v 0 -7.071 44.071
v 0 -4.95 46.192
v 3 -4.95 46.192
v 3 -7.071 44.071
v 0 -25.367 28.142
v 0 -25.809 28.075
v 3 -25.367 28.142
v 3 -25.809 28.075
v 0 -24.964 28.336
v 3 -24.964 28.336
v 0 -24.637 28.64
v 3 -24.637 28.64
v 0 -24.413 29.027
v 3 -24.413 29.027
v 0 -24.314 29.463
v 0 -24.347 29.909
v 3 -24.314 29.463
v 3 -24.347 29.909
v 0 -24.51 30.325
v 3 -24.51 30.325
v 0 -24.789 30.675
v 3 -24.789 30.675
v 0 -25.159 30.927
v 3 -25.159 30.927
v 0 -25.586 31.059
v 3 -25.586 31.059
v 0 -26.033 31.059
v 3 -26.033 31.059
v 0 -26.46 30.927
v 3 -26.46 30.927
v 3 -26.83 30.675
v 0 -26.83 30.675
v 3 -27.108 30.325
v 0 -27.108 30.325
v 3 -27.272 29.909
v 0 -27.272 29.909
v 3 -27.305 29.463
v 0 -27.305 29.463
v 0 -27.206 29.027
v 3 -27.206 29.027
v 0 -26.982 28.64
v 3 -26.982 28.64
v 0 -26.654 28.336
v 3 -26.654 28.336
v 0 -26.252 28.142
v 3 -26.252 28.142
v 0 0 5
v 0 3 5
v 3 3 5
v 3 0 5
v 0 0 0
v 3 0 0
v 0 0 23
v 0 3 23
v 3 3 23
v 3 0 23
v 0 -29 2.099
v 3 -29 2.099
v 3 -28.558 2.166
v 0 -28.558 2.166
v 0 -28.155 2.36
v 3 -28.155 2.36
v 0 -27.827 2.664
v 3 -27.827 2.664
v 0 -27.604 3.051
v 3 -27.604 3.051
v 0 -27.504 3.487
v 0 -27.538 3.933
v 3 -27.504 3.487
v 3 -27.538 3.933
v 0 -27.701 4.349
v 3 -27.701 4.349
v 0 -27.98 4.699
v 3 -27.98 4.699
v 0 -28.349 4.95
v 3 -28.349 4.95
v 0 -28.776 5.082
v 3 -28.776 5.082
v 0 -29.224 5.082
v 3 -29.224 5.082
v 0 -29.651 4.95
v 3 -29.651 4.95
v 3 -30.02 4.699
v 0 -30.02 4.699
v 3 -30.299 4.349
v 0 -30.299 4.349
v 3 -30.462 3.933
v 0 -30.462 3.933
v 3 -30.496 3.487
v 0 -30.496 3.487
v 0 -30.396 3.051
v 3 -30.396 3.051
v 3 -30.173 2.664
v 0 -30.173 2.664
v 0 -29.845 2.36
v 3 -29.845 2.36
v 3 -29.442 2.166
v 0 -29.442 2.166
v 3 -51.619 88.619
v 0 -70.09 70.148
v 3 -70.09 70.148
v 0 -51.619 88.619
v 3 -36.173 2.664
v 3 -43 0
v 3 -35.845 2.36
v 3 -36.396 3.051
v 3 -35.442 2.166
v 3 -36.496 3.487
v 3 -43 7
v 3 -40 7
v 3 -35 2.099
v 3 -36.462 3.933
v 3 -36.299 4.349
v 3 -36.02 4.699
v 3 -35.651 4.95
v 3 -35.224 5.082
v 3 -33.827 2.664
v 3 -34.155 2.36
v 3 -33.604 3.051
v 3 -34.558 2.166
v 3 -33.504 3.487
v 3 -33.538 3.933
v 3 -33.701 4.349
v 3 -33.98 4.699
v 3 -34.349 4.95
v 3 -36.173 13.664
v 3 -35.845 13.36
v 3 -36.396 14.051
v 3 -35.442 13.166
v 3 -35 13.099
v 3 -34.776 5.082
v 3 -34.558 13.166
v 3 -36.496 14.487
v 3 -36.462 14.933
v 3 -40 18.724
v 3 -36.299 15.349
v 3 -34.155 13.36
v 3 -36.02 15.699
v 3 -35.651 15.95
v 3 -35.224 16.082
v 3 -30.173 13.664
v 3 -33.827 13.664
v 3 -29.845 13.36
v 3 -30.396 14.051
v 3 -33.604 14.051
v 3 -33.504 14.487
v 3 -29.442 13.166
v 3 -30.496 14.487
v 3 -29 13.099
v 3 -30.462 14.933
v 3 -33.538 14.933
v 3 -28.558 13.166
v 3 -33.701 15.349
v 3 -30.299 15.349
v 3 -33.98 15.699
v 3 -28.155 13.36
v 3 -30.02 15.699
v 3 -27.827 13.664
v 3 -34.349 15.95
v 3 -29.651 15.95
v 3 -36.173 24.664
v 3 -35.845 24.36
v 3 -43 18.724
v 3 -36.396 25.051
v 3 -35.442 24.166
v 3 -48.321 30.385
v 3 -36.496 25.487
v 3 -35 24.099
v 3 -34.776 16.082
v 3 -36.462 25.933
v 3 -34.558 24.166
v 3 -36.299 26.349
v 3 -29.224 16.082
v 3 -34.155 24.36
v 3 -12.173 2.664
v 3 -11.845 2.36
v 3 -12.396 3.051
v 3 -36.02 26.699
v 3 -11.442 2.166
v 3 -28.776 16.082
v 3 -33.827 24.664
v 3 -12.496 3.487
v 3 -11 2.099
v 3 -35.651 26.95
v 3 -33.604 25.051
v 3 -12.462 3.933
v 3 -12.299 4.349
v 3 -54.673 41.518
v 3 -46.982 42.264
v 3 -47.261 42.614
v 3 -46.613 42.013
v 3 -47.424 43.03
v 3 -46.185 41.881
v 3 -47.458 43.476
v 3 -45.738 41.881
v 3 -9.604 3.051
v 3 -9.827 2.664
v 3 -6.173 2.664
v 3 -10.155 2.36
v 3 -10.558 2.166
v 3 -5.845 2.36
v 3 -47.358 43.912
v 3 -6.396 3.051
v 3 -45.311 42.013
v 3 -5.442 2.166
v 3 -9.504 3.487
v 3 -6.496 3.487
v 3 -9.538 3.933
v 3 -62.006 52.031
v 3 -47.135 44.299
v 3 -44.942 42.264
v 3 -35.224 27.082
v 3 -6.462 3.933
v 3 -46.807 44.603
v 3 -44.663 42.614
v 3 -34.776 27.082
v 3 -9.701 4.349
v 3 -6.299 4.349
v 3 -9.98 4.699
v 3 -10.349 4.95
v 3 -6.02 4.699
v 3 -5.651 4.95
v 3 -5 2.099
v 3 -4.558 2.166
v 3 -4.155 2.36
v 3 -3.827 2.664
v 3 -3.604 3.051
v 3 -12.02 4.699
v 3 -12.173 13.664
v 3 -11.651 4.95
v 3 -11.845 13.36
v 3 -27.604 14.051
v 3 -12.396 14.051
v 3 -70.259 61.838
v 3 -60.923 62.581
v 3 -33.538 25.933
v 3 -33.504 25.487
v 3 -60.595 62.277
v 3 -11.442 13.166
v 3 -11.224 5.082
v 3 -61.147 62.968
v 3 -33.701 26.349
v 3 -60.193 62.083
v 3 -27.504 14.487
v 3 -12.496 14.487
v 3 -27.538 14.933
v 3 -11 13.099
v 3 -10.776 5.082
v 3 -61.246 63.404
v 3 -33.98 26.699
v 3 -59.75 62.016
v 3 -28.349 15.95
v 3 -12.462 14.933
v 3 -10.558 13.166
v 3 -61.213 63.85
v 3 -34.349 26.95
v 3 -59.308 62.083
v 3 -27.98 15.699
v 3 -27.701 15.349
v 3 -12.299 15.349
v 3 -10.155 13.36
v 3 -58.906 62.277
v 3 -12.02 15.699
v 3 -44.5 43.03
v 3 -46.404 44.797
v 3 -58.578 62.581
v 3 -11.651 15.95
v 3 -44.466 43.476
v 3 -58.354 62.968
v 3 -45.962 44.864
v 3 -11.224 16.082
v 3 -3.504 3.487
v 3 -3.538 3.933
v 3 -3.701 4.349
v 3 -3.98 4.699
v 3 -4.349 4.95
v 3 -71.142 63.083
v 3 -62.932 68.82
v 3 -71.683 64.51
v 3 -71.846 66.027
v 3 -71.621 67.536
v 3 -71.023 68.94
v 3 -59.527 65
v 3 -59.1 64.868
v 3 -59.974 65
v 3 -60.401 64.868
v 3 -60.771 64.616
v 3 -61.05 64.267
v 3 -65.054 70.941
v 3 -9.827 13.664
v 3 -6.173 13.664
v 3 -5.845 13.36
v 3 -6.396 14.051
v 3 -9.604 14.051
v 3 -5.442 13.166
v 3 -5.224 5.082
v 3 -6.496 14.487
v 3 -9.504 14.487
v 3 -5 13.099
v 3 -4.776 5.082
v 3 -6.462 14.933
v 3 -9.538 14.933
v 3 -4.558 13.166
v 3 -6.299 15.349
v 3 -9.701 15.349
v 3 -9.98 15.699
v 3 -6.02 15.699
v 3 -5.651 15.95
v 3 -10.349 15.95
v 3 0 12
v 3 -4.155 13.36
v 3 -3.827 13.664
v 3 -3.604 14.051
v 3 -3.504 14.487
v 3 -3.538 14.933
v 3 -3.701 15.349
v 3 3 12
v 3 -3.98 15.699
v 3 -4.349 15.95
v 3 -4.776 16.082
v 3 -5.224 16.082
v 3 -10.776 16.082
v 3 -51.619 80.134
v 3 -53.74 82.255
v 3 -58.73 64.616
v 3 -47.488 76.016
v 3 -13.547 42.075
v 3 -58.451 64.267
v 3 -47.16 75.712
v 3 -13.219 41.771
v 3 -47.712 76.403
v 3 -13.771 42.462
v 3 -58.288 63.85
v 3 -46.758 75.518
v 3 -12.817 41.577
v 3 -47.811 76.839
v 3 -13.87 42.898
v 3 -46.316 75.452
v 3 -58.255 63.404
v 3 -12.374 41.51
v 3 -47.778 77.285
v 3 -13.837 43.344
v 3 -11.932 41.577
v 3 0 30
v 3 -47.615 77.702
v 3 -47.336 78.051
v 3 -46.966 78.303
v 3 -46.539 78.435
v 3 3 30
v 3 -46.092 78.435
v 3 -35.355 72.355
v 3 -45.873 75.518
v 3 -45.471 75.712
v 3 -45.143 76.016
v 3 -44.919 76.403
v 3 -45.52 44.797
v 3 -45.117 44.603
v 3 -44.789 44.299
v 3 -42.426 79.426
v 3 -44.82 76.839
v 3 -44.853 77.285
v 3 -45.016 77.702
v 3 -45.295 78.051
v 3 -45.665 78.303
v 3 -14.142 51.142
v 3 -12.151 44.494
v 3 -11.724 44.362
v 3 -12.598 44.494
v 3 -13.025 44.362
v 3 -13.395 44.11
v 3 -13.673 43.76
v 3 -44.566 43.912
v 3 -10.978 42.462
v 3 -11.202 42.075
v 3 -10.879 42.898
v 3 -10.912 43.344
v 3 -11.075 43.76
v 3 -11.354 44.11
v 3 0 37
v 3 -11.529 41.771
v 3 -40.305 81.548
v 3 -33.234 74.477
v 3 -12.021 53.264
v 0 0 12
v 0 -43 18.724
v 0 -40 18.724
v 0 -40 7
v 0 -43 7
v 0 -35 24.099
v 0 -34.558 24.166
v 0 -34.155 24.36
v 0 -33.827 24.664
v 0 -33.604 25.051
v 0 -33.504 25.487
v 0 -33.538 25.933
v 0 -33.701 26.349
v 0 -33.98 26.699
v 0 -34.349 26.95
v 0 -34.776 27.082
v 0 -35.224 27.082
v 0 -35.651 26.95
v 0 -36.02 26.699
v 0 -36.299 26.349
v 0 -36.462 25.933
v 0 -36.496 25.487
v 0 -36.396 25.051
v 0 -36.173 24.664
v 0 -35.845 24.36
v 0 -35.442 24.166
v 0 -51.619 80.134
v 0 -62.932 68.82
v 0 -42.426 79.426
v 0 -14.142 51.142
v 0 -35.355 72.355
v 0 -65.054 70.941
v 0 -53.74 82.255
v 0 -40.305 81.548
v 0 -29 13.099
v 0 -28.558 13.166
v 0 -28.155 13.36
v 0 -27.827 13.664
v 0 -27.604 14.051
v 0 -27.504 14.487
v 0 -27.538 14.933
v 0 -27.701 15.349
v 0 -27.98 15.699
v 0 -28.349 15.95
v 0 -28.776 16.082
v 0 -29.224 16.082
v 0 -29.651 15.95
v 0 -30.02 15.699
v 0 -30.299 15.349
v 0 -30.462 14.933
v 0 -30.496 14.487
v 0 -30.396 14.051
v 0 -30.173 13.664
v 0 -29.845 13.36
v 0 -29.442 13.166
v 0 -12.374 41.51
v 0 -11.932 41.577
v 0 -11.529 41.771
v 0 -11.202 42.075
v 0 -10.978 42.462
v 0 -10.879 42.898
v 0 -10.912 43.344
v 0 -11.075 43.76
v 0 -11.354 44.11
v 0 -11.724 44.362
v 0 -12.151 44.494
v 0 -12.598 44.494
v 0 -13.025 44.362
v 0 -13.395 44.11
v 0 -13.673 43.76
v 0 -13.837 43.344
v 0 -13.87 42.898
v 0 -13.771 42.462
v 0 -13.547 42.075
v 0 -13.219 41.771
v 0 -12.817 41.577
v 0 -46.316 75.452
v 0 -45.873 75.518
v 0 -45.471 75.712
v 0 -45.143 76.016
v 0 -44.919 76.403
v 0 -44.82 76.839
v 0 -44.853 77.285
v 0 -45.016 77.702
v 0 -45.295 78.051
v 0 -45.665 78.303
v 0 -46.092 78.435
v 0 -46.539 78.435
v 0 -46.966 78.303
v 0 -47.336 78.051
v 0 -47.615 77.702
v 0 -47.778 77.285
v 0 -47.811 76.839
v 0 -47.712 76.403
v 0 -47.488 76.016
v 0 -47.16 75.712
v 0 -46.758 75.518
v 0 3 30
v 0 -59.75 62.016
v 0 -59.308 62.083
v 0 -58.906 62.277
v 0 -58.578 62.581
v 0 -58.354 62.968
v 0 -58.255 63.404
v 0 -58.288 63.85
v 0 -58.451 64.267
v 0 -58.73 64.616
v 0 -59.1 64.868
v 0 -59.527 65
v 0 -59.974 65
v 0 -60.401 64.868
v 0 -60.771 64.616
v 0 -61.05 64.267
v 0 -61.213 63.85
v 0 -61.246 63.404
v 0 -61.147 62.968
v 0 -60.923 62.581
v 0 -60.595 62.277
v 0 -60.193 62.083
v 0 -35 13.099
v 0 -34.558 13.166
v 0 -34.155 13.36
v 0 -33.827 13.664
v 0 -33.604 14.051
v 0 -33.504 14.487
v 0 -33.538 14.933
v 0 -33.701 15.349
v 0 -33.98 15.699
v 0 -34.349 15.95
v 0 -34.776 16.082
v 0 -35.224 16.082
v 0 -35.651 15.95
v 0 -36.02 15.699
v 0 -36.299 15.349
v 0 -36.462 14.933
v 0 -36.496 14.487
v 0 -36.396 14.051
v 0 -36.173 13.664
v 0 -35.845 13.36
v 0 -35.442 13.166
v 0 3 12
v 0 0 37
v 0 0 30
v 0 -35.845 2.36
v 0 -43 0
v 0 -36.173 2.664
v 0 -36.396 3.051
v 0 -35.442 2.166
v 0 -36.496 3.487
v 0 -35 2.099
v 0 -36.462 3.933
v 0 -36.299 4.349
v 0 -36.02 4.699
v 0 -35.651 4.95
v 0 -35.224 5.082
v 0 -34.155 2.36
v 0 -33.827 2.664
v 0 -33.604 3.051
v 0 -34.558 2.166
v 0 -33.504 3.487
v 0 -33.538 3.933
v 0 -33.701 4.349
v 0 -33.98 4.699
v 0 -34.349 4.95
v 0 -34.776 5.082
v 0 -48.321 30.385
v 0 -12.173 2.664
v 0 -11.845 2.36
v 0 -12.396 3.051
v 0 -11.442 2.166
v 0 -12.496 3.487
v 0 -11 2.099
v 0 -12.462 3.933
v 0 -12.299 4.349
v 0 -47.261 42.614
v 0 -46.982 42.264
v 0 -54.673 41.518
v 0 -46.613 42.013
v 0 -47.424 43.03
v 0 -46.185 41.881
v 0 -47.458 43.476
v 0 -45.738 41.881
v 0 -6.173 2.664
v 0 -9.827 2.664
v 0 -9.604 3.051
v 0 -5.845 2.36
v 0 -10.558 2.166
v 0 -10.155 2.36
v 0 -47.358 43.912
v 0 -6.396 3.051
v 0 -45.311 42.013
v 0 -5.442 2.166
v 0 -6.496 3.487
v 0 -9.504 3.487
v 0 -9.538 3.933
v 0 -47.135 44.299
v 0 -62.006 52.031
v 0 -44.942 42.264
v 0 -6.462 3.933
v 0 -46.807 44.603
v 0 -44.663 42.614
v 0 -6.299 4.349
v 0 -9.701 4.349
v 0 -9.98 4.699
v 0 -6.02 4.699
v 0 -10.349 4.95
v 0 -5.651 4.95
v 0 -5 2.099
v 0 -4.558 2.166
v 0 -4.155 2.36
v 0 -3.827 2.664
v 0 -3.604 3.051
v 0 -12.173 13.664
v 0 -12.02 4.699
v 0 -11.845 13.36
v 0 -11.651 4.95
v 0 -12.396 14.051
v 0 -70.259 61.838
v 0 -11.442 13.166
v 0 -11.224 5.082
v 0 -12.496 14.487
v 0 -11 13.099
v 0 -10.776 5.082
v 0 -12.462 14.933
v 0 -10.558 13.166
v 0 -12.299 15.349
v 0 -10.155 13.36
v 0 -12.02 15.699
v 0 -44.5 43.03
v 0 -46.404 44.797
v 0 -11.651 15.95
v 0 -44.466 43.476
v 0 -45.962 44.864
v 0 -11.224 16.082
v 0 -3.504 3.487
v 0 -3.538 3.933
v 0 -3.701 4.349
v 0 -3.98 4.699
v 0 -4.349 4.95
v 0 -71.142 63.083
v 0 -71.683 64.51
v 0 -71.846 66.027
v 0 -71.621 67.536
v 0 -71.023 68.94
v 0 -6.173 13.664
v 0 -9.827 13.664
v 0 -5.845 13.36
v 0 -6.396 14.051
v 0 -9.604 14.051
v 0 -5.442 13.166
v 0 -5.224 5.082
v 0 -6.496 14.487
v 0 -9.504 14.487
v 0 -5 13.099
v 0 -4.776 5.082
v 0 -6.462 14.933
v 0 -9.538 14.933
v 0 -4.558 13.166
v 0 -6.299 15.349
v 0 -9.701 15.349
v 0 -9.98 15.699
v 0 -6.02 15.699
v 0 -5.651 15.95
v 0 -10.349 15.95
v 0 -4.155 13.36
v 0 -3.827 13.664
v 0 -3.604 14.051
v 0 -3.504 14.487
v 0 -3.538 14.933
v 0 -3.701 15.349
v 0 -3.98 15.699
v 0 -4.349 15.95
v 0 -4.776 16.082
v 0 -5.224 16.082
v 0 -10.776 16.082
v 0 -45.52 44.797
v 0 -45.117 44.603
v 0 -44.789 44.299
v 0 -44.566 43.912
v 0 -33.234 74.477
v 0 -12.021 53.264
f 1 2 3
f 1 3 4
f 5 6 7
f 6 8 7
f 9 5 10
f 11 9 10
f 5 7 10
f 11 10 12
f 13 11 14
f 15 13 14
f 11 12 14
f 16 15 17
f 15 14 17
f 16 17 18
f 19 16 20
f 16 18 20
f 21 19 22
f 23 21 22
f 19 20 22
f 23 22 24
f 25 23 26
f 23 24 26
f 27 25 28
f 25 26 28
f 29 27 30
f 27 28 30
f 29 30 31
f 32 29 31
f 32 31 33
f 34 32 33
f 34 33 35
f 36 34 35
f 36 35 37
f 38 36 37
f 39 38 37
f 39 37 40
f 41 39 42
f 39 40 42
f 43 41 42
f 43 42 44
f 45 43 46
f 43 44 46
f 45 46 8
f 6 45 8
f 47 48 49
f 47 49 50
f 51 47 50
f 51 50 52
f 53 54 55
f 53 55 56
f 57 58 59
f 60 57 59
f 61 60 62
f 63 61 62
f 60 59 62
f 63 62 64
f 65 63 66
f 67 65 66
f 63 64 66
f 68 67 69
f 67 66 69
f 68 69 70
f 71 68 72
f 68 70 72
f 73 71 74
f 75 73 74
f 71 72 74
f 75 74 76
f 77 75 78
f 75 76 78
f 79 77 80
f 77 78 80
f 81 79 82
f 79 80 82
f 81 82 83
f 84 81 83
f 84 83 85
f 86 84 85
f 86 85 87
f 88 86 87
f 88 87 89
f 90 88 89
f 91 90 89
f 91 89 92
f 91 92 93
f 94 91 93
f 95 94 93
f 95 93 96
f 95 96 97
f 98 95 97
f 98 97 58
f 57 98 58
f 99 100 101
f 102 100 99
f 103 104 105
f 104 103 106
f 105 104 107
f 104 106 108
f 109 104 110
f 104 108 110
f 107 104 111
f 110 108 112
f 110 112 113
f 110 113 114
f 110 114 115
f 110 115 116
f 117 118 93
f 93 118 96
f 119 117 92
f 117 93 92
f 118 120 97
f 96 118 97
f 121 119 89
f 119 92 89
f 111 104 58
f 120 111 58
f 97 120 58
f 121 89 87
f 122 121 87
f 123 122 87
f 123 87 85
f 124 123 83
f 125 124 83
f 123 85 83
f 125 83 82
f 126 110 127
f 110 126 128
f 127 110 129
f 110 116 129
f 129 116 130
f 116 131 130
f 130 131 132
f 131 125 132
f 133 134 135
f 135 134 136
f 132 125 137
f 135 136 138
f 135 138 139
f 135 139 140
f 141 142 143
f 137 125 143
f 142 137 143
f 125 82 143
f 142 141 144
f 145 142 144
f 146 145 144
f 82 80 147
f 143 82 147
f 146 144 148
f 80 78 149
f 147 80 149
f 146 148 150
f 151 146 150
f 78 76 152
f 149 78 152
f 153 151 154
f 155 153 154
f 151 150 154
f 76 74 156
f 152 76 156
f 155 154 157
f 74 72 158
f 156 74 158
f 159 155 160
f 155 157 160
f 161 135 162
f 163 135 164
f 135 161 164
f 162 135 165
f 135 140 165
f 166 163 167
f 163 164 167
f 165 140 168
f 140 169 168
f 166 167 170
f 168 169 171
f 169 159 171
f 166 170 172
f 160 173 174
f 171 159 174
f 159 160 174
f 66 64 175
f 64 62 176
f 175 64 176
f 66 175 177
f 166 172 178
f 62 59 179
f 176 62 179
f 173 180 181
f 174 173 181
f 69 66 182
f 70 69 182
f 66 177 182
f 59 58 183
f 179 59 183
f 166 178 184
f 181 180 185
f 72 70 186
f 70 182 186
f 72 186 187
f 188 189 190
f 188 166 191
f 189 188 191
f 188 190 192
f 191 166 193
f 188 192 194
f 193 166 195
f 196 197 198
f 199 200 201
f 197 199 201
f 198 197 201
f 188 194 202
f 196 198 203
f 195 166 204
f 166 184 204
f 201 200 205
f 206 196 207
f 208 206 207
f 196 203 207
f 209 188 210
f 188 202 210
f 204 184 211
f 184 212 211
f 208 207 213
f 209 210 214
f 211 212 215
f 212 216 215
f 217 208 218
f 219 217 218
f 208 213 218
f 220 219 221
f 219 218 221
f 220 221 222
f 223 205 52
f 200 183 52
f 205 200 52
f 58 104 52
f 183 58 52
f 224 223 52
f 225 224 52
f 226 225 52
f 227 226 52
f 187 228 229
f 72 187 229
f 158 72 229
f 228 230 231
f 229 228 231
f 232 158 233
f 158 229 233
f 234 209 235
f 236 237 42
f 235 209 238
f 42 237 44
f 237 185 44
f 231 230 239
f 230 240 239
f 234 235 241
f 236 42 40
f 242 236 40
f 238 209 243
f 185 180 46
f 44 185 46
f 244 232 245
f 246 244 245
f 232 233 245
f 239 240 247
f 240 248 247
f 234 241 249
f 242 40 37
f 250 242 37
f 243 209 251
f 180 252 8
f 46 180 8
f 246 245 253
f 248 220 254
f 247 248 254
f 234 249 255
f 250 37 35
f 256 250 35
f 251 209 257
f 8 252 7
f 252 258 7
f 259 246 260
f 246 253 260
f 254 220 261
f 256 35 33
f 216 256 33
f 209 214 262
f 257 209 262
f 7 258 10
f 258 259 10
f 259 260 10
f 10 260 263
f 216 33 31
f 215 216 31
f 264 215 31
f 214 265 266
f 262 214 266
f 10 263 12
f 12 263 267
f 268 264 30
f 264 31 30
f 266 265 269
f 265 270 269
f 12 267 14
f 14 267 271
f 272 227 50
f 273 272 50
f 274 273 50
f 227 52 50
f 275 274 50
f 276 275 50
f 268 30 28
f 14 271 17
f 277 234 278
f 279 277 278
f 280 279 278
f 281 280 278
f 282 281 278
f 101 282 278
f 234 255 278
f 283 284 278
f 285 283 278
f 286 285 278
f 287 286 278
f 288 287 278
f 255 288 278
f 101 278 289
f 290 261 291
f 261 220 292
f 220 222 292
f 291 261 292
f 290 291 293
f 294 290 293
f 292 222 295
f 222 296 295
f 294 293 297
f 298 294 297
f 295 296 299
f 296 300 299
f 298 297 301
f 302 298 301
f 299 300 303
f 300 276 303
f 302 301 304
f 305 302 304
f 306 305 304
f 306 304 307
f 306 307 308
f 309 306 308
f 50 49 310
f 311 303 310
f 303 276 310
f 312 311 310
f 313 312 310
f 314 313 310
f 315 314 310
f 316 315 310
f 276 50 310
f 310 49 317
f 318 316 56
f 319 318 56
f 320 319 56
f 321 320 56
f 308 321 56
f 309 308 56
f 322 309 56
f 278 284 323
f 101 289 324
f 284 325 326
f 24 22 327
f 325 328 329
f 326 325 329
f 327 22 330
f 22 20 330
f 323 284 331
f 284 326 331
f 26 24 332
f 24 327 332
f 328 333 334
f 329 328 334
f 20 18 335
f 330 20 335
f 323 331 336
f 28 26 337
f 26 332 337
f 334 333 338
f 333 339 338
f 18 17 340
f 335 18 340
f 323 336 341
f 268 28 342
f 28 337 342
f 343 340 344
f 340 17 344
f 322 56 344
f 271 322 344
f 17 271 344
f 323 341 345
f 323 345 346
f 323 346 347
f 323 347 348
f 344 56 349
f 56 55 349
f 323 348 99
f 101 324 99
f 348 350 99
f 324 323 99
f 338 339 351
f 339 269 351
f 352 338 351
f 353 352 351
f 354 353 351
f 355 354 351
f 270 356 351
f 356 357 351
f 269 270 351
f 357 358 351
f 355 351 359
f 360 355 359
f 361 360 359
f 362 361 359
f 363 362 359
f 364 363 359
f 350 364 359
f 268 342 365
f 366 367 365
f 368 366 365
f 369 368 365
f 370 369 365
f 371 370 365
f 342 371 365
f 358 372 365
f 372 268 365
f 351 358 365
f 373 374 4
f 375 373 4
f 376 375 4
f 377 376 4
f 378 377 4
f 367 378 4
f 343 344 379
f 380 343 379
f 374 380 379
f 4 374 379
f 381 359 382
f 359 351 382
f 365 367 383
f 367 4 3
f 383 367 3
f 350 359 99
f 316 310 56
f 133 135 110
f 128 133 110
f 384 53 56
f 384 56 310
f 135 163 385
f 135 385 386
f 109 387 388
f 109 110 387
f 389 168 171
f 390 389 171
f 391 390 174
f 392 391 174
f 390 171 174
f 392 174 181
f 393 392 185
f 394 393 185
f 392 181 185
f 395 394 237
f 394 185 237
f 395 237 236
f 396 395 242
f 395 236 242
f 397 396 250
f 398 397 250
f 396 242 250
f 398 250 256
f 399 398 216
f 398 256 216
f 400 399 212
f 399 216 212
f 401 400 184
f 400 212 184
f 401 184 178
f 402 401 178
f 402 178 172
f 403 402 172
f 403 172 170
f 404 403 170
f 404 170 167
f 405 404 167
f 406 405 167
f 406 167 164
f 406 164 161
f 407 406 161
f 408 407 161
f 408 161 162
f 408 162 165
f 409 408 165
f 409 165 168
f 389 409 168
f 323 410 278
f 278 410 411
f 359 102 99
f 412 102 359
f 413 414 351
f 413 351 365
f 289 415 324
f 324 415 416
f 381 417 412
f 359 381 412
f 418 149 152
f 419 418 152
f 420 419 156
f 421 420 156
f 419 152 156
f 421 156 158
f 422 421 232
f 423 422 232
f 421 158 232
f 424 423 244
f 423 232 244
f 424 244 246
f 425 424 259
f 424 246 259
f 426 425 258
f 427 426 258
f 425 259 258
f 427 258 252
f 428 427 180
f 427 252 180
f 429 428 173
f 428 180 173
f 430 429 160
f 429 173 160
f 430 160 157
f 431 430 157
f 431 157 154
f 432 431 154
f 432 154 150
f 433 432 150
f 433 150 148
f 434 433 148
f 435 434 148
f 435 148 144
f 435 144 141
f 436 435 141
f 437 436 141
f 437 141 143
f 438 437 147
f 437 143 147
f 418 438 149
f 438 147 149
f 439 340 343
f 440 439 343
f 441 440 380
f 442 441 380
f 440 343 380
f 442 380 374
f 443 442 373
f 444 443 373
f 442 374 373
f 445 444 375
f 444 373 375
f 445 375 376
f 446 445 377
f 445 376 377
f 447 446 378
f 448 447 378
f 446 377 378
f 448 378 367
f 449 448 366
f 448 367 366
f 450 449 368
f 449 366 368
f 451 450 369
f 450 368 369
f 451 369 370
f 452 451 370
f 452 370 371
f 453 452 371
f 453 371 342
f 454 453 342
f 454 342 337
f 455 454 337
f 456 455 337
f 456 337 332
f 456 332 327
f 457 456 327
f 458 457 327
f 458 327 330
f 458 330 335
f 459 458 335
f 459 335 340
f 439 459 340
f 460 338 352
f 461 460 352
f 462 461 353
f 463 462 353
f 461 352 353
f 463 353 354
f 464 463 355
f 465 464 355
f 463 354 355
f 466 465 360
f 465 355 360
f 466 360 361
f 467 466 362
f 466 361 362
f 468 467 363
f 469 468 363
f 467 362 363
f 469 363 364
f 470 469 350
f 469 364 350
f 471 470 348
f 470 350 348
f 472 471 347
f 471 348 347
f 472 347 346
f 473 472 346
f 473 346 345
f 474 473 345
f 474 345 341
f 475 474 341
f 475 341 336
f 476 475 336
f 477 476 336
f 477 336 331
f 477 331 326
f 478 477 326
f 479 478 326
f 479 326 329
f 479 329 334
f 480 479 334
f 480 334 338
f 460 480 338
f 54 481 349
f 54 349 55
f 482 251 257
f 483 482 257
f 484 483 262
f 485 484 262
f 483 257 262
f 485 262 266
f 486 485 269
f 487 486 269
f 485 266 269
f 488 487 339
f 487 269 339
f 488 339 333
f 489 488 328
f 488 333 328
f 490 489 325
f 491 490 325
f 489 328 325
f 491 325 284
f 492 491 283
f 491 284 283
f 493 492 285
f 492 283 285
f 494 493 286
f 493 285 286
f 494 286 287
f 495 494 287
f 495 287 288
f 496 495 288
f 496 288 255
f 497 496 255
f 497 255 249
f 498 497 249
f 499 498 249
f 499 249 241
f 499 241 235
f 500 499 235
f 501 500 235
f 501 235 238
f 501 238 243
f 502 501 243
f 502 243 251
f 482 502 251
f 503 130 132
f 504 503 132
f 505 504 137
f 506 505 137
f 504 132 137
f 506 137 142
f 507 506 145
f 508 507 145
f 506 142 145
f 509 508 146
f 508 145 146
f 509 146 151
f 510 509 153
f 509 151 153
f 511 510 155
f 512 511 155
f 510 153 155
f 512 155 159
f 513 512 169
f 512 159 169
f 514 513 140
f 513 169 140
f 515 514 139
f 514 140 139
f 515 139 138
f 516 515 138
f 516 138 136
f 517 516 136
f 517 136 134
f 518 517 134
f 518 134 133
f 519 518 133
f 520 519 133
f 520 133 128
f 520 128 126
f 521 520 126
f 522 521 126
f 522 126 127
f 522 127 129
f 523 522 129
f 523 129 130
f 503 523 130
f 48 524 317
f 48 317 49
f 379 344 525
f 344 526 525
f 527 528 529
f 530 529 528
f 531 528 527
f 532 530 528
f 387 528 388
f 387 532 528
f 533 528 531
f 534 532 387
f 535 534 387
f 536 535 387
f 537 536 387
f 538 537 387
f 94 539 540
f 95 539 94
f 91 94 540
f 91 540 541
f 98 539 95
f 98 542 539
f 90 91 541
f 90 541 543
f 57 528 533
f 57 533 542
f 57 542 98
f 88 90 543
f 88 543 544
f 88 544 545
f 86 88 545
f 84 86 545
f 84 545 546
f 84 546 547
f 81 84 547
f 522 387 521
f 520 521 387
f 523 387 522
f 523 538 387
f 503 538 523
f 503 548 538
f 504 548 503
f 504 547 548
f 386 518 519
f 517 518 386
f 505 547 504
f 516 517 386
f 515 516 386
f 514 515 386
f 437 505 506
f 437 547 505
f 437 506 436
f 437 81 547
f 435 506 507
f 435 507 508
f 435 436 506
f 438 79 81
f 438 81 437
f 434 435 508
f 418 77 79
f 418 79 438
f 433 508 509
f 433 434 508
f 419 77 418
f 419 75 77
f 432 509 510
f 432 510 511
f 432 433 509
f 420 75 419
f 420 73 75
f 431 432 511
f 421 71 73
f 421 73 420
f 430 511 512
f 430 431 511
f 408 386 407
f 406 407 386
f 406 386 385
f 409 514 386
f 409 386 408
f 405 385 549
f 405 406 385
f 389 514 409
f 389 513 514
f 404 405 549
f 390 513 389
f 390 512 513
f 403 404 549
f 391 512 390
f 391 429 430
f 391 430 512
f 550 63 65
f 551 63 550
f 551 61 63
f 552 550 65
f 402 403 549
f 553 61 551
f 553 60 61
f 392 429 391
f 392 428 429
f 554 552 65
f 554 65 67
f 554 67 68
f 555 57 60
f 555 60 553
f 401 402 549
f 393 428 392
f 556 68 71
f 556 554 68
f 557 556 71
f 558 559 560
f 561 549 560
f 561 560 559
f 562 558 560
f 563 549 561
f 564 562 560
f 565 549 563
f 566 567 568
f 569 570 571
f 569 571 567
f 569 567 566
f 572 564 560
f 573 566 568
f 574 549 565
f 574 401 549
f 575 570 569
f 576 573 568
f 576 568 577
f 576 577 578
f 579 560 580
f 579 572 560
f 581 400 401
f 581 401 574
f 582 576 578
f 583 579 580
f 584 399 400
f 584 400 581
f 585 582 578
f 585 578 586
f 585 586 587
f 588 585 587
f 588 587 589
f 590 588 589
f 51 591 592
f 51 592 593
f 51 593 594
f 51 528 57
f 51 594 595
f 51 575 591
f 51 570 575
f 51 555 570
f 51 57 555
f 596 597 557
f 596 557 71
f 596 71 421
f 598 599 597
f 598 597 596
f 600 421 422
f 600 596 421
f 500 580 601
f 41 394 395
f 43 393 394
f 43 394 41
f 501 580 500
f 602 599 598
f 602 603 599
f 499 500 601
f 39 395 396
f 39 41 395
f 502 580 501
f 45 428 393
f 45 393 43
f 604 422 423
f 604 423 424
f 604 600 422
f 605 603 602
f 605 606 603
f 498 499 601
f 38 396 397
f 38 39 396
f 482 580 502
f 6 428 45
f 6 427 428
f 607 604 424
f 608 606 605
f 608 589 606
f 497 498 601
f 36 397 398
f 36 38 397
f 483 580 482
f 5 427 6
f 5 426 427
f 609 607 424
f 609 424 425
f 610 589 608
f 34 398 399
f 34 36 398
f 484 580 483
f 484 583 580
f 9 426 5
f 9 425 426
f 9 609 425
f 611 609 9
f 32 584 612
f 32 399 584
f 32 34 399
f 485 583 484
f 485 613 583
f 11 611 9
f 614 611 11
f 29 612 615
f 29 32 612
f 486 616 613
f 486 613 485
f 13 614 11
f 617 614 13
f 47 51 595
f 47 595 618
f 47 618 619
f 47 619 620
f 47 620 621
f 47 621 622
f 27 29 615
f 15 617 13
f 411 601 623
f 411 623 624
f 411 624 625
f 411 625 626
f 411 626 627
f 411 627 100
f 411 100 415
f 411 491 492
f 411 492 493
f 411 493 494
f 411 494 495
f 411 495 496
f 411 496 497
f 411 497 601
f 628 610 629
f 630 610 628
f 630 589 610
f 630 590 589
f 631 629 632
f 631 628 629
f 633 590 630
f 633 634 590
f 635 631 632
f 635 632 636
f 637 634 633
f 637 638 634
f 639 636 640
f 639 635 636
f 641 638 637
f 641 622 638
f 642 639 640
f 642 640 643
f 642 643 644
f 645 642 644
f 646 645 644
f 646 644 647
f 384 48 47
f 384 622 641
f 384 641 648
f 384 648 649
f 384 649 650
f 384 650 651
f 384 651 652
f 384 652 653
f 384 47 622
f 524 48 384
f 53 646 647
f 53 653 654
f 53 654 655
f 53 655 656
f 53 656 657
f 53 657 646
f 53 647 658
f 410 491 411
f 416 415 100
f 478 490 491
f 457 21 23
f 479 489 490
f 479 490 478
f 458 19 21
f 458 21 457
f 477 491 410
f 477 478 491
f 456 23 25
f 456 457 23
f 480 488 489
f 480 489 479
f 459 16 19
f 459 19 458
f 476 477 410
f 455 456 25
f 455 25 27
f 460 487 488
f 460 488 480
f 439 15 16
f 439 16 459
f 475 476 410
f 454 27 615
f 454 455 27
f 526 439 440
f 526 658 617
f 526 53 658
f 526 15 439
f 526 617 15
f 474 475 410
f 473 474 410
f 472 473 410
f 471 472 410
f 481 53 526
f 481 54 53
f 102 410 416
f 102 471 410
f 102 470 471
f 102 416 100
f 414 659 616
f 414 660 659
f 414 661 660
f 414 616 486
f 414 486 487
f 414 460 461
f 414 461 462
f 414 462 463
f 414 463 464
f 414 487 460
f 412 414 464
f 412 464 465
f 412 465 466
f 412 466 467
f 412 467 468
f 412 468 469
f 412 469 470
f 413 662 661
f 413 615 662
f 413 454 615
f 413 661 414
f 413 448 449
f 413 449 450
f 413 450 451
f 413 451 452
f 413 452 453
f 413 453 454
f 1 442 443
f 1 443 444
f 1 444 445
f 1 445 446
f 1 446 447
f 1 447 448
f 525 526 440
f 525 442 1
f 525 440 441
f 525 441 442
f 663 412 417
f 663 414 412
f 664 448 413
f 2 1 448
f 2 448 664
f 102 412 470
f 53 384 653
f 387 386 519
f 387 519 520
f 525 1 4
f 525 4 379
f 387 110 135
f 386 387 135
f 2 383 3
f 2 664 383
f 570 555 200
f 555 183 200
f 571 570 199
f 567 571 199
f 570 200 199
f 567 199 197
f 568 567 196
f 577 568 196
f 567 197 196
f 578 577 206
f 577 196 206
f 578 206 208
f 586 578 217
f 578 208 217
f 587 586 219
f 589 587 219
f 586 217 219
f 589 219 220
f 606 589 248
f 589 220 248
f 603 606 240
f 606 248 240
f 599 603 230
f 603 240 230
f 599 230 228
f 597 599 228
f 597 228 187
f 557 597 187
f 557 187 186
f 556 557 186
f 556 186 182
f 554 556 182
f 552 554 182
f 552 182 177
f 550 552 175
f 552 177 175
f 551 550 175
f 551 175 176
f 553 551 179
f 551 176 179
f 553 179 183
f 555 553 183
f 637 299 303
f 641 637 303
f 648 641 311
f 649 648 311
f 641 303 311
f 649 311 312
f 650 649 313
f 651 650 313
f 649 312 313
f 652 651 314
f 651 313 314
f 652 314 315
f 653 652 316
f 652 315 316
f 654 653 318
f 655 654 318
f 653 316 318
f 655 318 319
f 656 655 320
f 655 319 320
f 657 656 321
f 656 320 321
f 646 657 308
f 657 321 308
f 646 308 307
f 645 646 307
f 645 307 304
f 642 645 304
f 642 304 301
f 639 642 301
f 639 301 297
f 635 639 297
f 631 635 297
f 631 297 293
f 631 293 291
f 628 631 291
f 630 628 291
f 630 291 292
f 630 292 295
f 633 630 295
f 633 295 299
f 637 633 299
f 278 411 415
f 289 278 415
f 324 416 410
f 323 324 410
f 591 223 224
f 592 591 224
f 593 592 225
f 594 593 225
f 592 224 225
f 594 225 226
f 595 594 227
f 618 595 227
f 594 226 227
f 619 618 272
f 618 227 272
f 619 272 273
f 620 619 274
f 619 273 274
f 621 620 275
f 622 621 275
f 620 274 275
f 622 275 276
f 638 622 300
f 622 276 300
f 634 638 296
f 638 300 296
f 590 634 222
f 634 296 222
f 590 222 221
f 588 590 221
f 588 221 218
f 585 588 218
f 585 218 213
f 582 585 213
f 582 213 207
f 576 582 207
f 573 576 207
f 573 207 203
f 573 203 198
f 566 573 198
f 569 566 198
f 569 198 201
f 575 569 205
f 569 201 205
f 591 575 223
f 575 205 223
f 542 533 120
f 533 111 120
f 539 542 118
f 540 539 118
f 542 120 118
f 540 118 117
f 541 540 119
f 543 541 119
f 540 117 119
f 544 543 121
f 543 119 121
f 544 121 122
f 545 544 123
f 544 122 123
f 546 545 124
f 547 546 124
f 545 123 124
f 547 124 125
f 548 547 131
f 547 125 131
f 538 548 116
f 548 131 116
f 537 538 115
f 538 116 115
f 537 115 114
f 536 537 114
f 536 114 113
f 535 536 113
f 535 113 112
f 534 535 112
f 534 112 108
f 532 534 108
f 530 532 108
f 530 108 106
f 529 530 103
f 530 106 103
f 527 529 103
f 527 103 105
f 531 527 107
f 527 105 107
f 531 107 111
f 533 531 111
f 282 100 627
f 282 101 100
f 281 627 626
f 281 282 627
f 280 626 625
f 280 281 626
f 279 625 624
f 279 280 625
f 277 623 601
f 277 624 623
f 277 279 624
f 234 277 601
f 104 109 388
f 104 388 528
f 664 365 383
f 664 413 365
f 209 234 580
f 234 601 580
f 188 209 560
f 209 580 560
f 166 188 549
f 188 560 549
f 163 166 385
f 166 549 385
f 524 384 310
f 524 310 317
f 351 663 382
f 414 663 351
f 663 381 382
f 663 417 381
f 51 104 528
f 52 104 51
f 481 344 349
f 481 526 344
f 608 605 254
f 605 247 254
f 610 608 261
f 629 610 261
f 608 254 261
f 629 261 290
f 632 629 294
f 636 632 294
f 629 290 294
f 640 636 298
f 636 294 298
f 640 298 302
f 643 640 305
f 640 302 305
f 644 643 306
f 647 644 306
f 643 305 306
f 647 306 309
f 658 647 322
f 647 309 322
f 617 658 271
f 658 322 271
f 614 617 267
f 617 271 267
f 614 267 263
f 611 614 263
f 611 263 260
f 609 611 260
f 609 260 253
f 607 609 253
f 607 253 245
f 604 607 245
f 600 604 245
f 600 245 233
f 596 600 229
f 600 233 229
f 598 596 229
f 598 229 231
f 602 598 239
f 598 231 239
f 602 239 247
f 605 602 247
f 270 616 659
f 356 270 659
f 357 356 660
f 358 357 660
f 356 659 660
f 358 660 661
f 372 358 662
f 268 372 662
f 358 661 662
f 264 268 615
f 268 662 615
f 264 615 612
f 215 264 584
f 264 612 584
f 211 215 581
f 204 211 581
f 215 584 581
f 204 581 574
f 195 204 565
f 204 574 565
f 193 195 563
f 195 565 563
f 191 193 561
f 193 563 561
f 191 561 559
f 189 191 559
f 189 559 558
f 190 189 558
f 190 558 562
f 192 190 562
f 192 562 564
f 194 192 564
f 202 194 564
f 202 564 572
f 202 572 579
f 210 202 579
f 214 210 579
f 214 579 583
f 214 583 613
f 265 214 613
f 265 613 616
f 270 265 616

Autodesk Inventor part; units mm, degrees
ref_plane "YZ Plane" through (0, 0, 0) normal (1, 0, 0) x (0, 1, 0)
ref_plane "XZ Plane" through (0, 0, 0) normal (0, 1, 0) x (-1, 0, 0)
ref_plane "XY Plane" through (0, 0, 0) normal (0, 0, 1) x (1, 0, 0)
sketch "Sketch1" plane through (0, 0, 0) normal (1, 0, 0) x (0, 1, 0)
  line L0 (-51.6188, 88.6188) -> (0, 37) construction
  line L1 (0, 37) -> (0, 0) construction
  line L2 (0, 0) -> (-40, 0)
  line L3 (-40, 0) -> (-71.4178, 68.8198)
  line L4 (-51.6188, 88.6188) -> (-42.4264, 79.4264)
  line L5 (-40.3051, 81.5477) -> (-42.4264, 79.4264)
  line L6 (-40.3051, 81.5477) -> (-33.234, 74.4767)
  line L7 (-33.234, 74.4767) -> (-35.3553, 72.3553)
  line L8 (-35.3553, 72.3553) -> (-14.1421, 51.1421)
  line L9 (-14.1421, 51.1421) -> (-12.0208, 53.2635)
  line L10 (-12.0208, 53.2635) -> (-4.9497, 46.1924)
  line L11 (-4.9497, 46.1924) -> (-7.0711, 44.0711)
  line L12 (-7.0711, 44.0711) -> (0, 37)
  line L13 (0, 30) -> (3, 30)
  line L14 (3, 30) -> (3, 23)
  line L15 (3, 23) -> (0, 23)
  line L16 (0, 23) -> (0, 12)
  line L17 (0, 12) -> (3, 12)
  line L18 (3, 12) -> (3, 5)
  line L19 (3, 5) -> (0, 5)
  line L20 (0, 5) -> (0, 0)
  line L21 (0, 30) -> (0, 37)
  line L22 (-51.6188, 88.6188) -> (-71.4178, 68.8198)
  line L23 (-53.7401, 82.2548) -> (-51.6188, 80.1335)
  line L24 (-51.6188, 80.1335) -> (-62.9325, 68.8198)
  line L25 (-62.9325, 68.8198) -> (-65.0538, 70.9411)
  line L26 (-65.0538, 70.9411) -> (-53.7401, 82.2548)
  dimension "d3" = 40
  dimension "d5" = 135
  dimension "d6" = 28
  dimension "d10" = 73
  dimension "d11" = 37
  dimension "d14" = 10
  dimension "d15" = 10
  dimension "d16" = 10
  dimension "d17" = 7
  dimension "d18" = 5
  dimension "d19" = 7
  dimension "d20" = 7
  dimension "d21" = 3
  dimension "d25" = 6
  dimension "d26" = 6
  dimension "d27" = 3
  dimension "d28" = 3
  dimension "d29" = 13
  dimension "d30" = 3
extrude "Extrusion1" add sketch "Sketch1" along normal blind 3
sketch "Sketch2" plane through (3, 0, 0) normal (1, 0, 0) x (0, 0, -1)
  circle A0 centre (-76.9515, -46.3155) radius 1.5
  line L0 (-76.9515, -46.3155) -> (-43.0104, -12.3744) construction
  line L1 (-43.0104, -12.3744) -> (-29.5754, -25.8094) construction
  line L2 (-29.5754, -25.8094) -> (-63.5165, -59.7505) construction
  line L3 (-63.5165, -59.7505) -> (-76.9515, -46.3155) construction
  line L4 (-51.1421, -14.1421) -> (-72.3553, -35.3553) construction
  line L5 (-80.1335, -51.6188) -> (-68.8198, -62.9325) construction
  circle A1 centre (-43.0104, -12.3744) radius 1.5
  circle A2 centre (-29.5754, -25.8094) radius 1.5
  circle A3 centre (-63.5165, -59.7505) radius 1.5
  point P0 (0, 0)
  dimension "d31" = 3
  dimension "d32" = 6
  dimension "d33" = 4.5
  dimension "d34" = 19
  dimension "d35" = 3
  dimension "d36" = 3
  dimension "d37" = 3
  dimension "d38" = 48
extrude "Extrusion2" cut sketch "Sketch2" against normal blind 3
sketch "Sketch3" plane through (3, 0, 0) normal (1, 0, 0) x (0, 0, -1)
  circle A0 centre (-29.5754, -25.8094) radius 1.5 projected
  circle A1 centre (-76.9515, -46.3155) radius 1.5 projected
  circle A2 centre (-43.0104, -12.3744) radius 1.5 projected
  circle A3 centre (-63.5165, -59.7505) radius 1.5 projected
  line L0 (-80.1335, -51.6188) -> (-68.8198, -62.9325) projected
  line L1 (-68.8198, -62.9325) -> (-70.9411, -65.0538) projected
  line L2 (-70.9411, -65.0538) -> (-82.2548, -53.7401) projected
  line L3 (-82.2548, -53.7401) -> (-80.1335, -51.6188) projected
  line L4 (-79.4264, -42.4264) -> (-88.6188, -51.6188) projected
  line L5 (-88.6188, -51.6188) -> (-68.8198, -71.4178) projected
  line L6 (-68.8198, -71.4178) -> (0, -40) projected
  line L7 (0, -40) -> (0, 0) projected
  line L8 (0, 0) -> (-5, 0) projected
  line L9 (-5, 0) -> (-5, 3) projected
  line L10 (-5, 3) -> (-12, 3) projected
  line L11 (-12, 3) -> (-12, 0) projected
  line L12 (-12, 0) -> (-23, 0) projected
  line L13 (-23, 0) -> (-23, 3) projected
  line L14 (-23, 3) -> (-30, 3) projected
  line L15 (-30, 3) -> (-30, 0) projected
  line L16 (-30, 0) -> (-37, 0) projected
  line L17 (-37, 0) -> (-44.0711, -7.0711) projected
  line L18 (-44.0711, -7.0711) -> (-46.1924, -4.9497) projected
  line L19 (-46.1924, -4.9497) -> (-53.2635, -12.0208) projected
  line L20 (-53.2635, -12.0208) -> (-51.1421, -14.1421) projected
  line L21 (-51.1421, -14.1421) -> (-72.3553, -35.3553) projected
  line L22 (-72.3553, -35.3553) -> (-74.4767, -33.234) projected
  line L23 (-74.4767, -33.234) -> (-81.5477, -40.3051) projected
  line L24 (-81.5477, -40.3051) -> (-79.4264, -42.4264) projected
  arc A4 (0, -40) -> (-68.8198, -71.4178) centre (7.69, -147.9276) ccw
  line L25 (-68.8198, -71.4178) -> (-27.8142, -30.4121)
  line L26 (-51.1421, -14.1421) -> (-72.3553, -35.3553) projected
extrude "Extrusion3" cut sketch "Sketch3" against normal blind 3 contours A4 L6
sketch "Sketch4" plane through (3, 0, 0) normal (1, 0, 0) x (0, 0, -1)
  arc A0 (0, -40) -> (-68.8198, -71.4178) centre (7.69, -147.9276) ccw projected
  line L0 (0, -40) -> (0, 0) projected
  line L1 (0, 0) -> (-5, 0) projected
  line L2 (-5, 0) -> (-5, 3) projected
  line L3 (-5, 3) -> (-12, 3) projected
  line L4 (-12, 3) -> (-12, 0) projected
  line L5 (-12, 0) -> (-23, 0) projected
  line L6 (-23, 0) -> (-23, 3) projected
  line L7 (-23, 3) -> (-30, 3) projected
  line L8 (-30, 3) -> (-30, 0) projected
  line L9 (-30, 0) -> (-37, 0) projected
  line L10 (-37, 0) -> (-44.0711, -7.0711) projected
  line L11 (-44.0711, -7.0711) -> (-46.1924, -4.9497) projected
  line L12 (-46.1924, -4.9497) -> (-53.2635, -12.0208) projected
  line L13 (-53.2635, -12.0208) -> (-51.1421, -14.1421) projected
  line L14 (-51.1421, -14.1421) -> (-72.3553, -35.3553) projected
  line L15 (-72.3553, -35.3553) -> (-74.4767, -33.234) projected
  line L16 (-74.4767, -33.234) -> (-81.5477, -40.3051) projected
  line L17 (-81.5477, -40.3051) -> (-79.4264, -42.4264) projected
  line L18 (-79.4264, -42.4264) -> (-88.6188, -51.6188) projected
  line L19 (-88.6188, -51.6188) -> (-68.8198, -71.4178) projected
  circle A1 centre (-29.5754, -25.8094) radius 1.5 projected
  circle A2 centre (-76.9515, -46.3155) radius 1.5 projected
  circle A3 centre (-43.0104, -12.3744) radius 1.5 projected
  circle A4 centre (-63.5165, -59.7505) radius 1.5 projected
  line L20 (-80.1335, -51.6188) -> (-68.8198, -62.9325) projected
  line L21 (-68.8198, -62.9325) -> (-70.9411, -65.0538) projected
  line L22 (-70.9411, -65.0538) -> (-82.2548, -53.7401) projected
  line L23 (-82.2548, -53.7401) -> (-80.1335, -51.6188) projected
  line L24 (0, -40) -> (-18.724, -40)
  line L25 (-18.724, -43) -> (0, -43)
  line L26 (0, -43) -> (0, -40)
  line L27 (-18.724, -43) -> (-18.724, -40)
  dimension "d44" = 3
extrude "Extrusion4" cut sketch "Sketch4" against normal blind 3 contours L26 L25 A0 | A0 L27 L24
sketch "Sketch5" plane through (3, 0, 0) normal (1, 0, 0) x (0, 0, -1)
  line L0 (-80.1335, -51.6188) -> (-68.8198, -62.9325) projected
  line L1 (-68.8198, -62.9325) -> (-70.9411, -65.0538) projected
  line L2 (-70.9411, -65.0538) -> (-82.2548, -53.7401) projected
  line L3 (-82.2548, -53.7401) -> (-80.1335, -51.6188) projected
  circle A0 centre (-63.5165, -59.7505) radius 1.5 projected
  circle A1 centre (-43.0104, -12.3744) radius 1.5 projected
  circle A2 centre (-76.9515, -46.3155) radius 1.5 projected
  circle A3 centre (-29.5754, -25.8094) radius 1.5 projected
  line L4 (-18.724, -43) -> (-18.724, -40) projected
  line L5 (-18.724, -40) -> (0, -40) projected
  line L6 (0, -40) -> (0, 0) projected
  line L7 (0, 0) -> (-5, 0) projected
  line L8 (-5, 0) -> (-5, 3) projected
  line L9 (-5, 3) -> (-12, 3) projected
  line L10 (-12, 3) -> (-12, 0) projected
  line L11 (-12, 0) -> (-23, 0) projected
  line L12 (-23, 0) -> (-23, 3) projected
  line L13 (-23, 3) -> (-30, 3) projected
  line L14 (-30, 3) -> (-30, 0) projected
  line L15 (-30, 0) -> (-37, 0) projected
  line L16 (-37, 0) -> (-44.0711, -7.0711) projected
  line L17 (-44.0711, -7.0711) -> (-46.1924, -4.9497) projected
  line L18 (-46.1924, -4.9497) -> (-53.2635, -12.0208) projected
  line L19 (-53.2635, -12.0208) -> (-51.1421, -14.1421) projected
  line L20 (-51.1421, -14.1421) -> (-72.3553, -35.3553) projected
  line L21 (-72.3553, -35.3553) -> (-74.4767, -33.234) projected
  line L22 (-74.4767, -33.234) -> (-81.5477, -40.3051) projected
  line L23 (-81.5477, -40.3051) -> (-79.4264, -42.4264) projected
  line L24 (-79.4264, -42.4264) -> (-88.6188, -51.6188) projected
  line L25 (-88.6188, -51.6188) -> (-68.8198, -71.4178) projected
  arc A4 (-18.724, -43) -> (-68.8198, -71.4178) centre (7.69, -147.9276) ccw projected
  line L26 (0, -40) -> (-18.724, -40) projected
  line L27 (0, -40) -> (-7, -40)
  line L28 (-7, -40) -> (-7, -43)
  line L29 (-7, -43) -> (0, -43)
  line L30 (0, -43) -> (0, -40)
  dimension "d47" = 3
  dimension "d48" = 7
extrude "Extrusion5" add sketch "Sketch5" against normal blind 3 contours L5 L30 L29 L28
sketch "Sketch6" plane through (3, 0, 0) normal (1, 0, 0) x (0, 0, -1)
  line L0 (-14.599, -5) -> (-3.599, -5) construction
  line L1 (-3.599, -5) -> (-3.599, -35) construction
  line L2 (-3.599, -35) -> (-14.599, -35) construction
  line L3 (-14.599, -35) -> (-14.599, -5) construction
  circle A0 centre (-3.599, -5) radius 1.5
  circle A1 centre (-14.599, -5) radius 1.5
  circle A2 centre (-14.599, -35) radius 1.5
  circle A3 centre (-14.599, -29) radius 1.5
  circle A4 centre (-14.599, -11) radius 1.5
  circle A5 centre (-3.599, -11) radius 1.5
  circle A6 centre (-3.599, -29) radius 1.5
  circle A7 centre (-3.599, -35) radius 1.5
  line L4 (0, 0) -> (0, -43) projected
  line L5 (-5, 0) -> (0, 0) projected
  line L6 (0, -43) -> (-7, -43) projected
  circle A8 centre (-25.599, -35) radius 1.5
  line L7 (-7, -43) -> (-7, -40) projected
  line L8 (-18.724, -40) -> (-18.724, -43) projected
  dimension "d51" = 3
  dimension "d52" = 3
  dimension "d53" = 3
  dimension "d54" = 3
  dimension "d55" = 3
  dimension "d56" = 3
  dimension "d57" = 3
  dimension "d58" = 3
  dimension "d59" = 3
  dimension "d62" = 3.599
  dimension "d63" = 5
  dimension "d64" = 11
  dimension "d65" = 6
  dimension "d66" = 6
  dimension "d67" = 5
  dimension "d68" = 11
extrude "Extrusion6" cut sketch "Sketch6" against normal blind 3
sketch "Sketch8" plane through (0, 0, 0) normal (-1, 0, 0) x (0, 0, 1)
  line L0 (68.8198, -71.4178) -> (48.209, -50.807)
  line L1 (48.209, -50.807) -> (45.3806, -53.6354)
  line L2 (45.3806, -53.6354) -> (65.9914, -74.2462)
  line L3 (65.9914, -74.2462) -> (68.8198, -71.4178)
  line L4 (88.6188, -51.6188) -> (68.8198, -71.4178) projected
  arc A0 (68.8198, -71.4178) -> (18.724, -43) centre (-7.69, -147.9276) ccw projected
  point P0 (0, 0)
  dimension "d70" = 4
extrude "Extrusion7" add sketch "Sketch8" against normal blind 3 contours L3 L2 A0
sketch "Sketch9" plane through (0, 0, 0) normal (-1, 0, 0) x (0, 0, 1)
  circle A0 centre (3.599, -35) radius 1.5 projected
  circle A1 centre (3.599, -11) radius 1.5 projected
  circle A2 centre (14.599, -29) radius 1.5 projected
  circle A3 centre (14.599, -5) radius 1.5 projected
  circle A4 centre (3.599, -5) radius 1.5 projected
  circle A5 centre (14.599, -35) radius 1.5 projected
  circle A6 centre (14.599, -11) radius 1.5 projected
  circle A7 centre (3.599, -29) radius 1.5 projected
  circle A8 centre (25.599, -35) radius 1.5 projected
  line L0 (18.724, -40) -> (18.724, -43) projected
  arc A9 (45.3806, -53.6354) -> (18.724, -43) centre (-7.69, -147.9276) ccw projected
  line L1 (45.3806, -53.6354) -> (65.9914, -74.2462) projected
  line L2 (65.9914, -74.2462) -> (88.6188, -51.6188) projected
  line L3 (88.6188, -51.6188) -> (79.4264, -42.4264) projected
  line L4 (79.4264, -42.4264) -> (81.5477, -40.3051) projected
  line L5 (81.5477, -40.3051) -> (74.4767, -33.234) projected
  line L6 (74.4767, -33.234) -> (72.3553, -35.3553) projected
  line L7 (72.3553, -35.3553) -> (51.1421, -14.1421) projected
  line L8 (51.1421, -14.1421) -> (53.2635, -12.0208) projected
  line L9 (53.2635, -12.0208) -> (46.1924, -4.9497) projected
  line L10 (46.1924, -4.9497) -> (44.0711, -7.0711) projected
  line L11 (44.0711, -7.0711) -> (37, 0) projected
  line L12 (37, 0) -> (30, 0) projected
  line L13 (30, 0) -> (30, 3) projected
  line L14 (30, 3) -> (23, 3) projected
  line L15 (23, 3) -> (23, 0) projected
  line L16 (23, 0) -> (12, 0) projected
  line L17 (12, 0) -> (12, 3) projected
  line L18 (12, 3) -> (5, 3) projected
  line L19 (5, 3) -> (5, 0) projected
  line L20 (5, 0) -> (0, 0) projected
  line L21 (0, 0) -> (0, -43) projected
  line L22 (0, -43) -> (7, -43) projected
  line L23 (7, -43) -> (7, -40) projected
  line L24 (7, -40) -> (18.724, -40) projected
  line L25 (68.8198, -62.9325) -> (80.1335, -51.6188) projected
  line L26 (80.1335, -51.6188) -> (82.2548, -53.7401) projected
  line L27 (82.2548, -53.7401) -> (70.9411, -65.0538) projected
  line L28 (70.9411, -65.0538) -> (68.8198, -62.9325) projected
  circle A10 centre (63.5165, -59.7505) radius 1.5 projected
  circle A11 centre (43.0104, -12.3744) radius 1.5 projected
  circle A12 centre (76.9515, -46.3155) radius 1.5 projected
  circle A13 centre (29.5754, -25.8094) radius 1.5 projected
  arc A14 (65.9914, -74.2462) -> (18.724, -43) centre (-34.2053, -174.4429) ccw
extrude "Extrusion8" add sketch "Sketch9" against normal blind 3 contours A9 L1 A14
sketch "Sketch10" plane through (0, 0, 0) normal (-1, 0, 0) x (0, 0, 1)
  circle A0 centre (3.599, -35) radius 1.5 projected
  circle A1 centre (3.599, -11) radius 1.5 projected
  circle A2 centre (14.599, -29) radius 1.5 projected
  circle A3 centre (14.599, -5) radius 1.5 projected
  circle A4 centre (3.599, -5) radius 1.5 projected
  circle A5 centre (14.599, -35) radius 1.5 projected
  circle A6 centre (14.599, -11) radius 1.5 projected
  circle A7 centre (3.599, -29) radius 1.5 projected
  circle A8 centre (25.599, -35) radius 1.5 projected
  line L0 (18.724, -40) -> (18.724, -43) projected
  arc A9 (65.9914, -74.2462) -> (18.724, -43) centre (-34.2053, -174.4429) ccw projected
  line L1 (65.9914, -74.2462) -> (88.6188, -51.6188) projected
  line L2 (88.6188, -51.6188) -> (79.4264, -42.4264) projected
  line L3 (79.4264, -42.4264) -> (81.5477, -40.3051) projected
  line L4 (81.5477, -40.3051) -> (74.4767, -33.234) projected
  line L5 (74.4767, -33.234) -> (72.3553, -35.3553) projected
  line L6 (72.3553, -35.3553) -> (51.1421, -14.1421) projected
  line L7 (51.1421, -14.1421) -> (53.2635, -12.0208) projected
  line L8 (53.2635, -12.0208) -> (46.1924, -4.9497) projected
  line L9 (46.1924, -4.9497) -> (44.0711, -7.0711) projected
  line L10 (44.0711, -7.0711) -> (37, 0) projected
  line L11 (37, 0) -> (30, 0) projected
  line L12 (30, 0) -> (30, 3) projected
  line L13 (30, 3) -> (23, 3) projected
  line L14 (23, 3) -> (23, 0) projected
  line L15 (23, 0) -> (12, 0) projected
  line L16 (12, 0) -> (12, 3) projected
  line L17 (12, 3) -> (5, 3) projected
  line L18 (5, 3) -> (5, 0) projected
  line L19 (5, 0) -> (0, 0) projected
  line L20 (0, 0) -> (0, -43) projected
  line L21 (0, -43) -> (7, -43) projected
  line L22 (7, -43) -> (7, -40) projected
  line L23 (7, -40) -> (18.724, -40) projected
  line L24 (68.8198, -62.9325) -> (80.1335, -51.6188) projected
  line L25 (80.1335, -51.6188) -> (82.2548, -53.7401) projected
  line L26 (82.2548, -53.7401) -> (70.9411, -65.0538) projected
  line L27 (70.9411, -65.0538) -> (68.8198, -62.9325) projected
  circle A10 centre (63.5165, -59.7505) radius 1.5 projected
  circle A11 centre (43.0104, -12.3744) radius 1.5 projected
  circle A12 centre (76.9515, -46.3155) radius 1.5 projected
  circle A13 centre (29.5754, -25.8094) radius 1.5 projected
  circle A14 centre (43.364, -45.9619) radius 1.5
  dimension "d75" = 28
  dimension "d76" = 3
  dimension "d77" = 36
extrude "Extrusion9" cut sketch "Sketch10" against normal blind 3 contours A14
fillet "Fillet2" radius 6 1 edges at (1.5, -74.2462, 65.9914)
sketch "Sketch11" plane through (3, 0, 0) normal (1, 0, 0) x (0, 0, -1)
  arc A0 (-70.1478, -70.0898) -> (-61.8384, -70.2586) centre (-65.9052, -65.8471) ccw projected
  arc A1 (-18.724, -43) -> (-61.8384, -70.2586) centre (34.2053, -174.4429) ccw projected
  line L0 (-18.724, -43) -> (-18.724, -40) projected
  line L1 (-18.724, -40) -> (-7, -40) projected
  line L2 (-7, -40) -> (-7, -43) projected
  line L3 (-7, -43) -> (0, -43) projected
  line L4 (0, -43) -> (0, 0) projected
  line L5 (0, 0) -> (-5, 0) projected
  line L6 (-5, 0) -> (-5, 3) projected
  line L7 (-5, 3) -> (-12, 3) projected
  line L8 (-12, 3) -> (-12, 0) projected
  line L9 (-12, 0) -> (-23, 0) projected
  line L10 (-23, 0) -> (-23, 3) projected
  line L11 (-23, 3) -> (-30, 3) projected
  line L12 (-30, 3) -> (-30, 0) projected
  line L13 (-30, 0) -> (-37, 0) projected
  line L14 (-37, 0) -> (-44.0711, -7.0711) projected
  line L15 (-44.0711, -7.0711) -> (-46.1924, -4.9497) projected
  line L16 (-46.1924, -4.9497) -> (-53.2635, -12.0208) projected
  line L17 (-53.2635, -12.0208) -> (-51.1421, -14.1421) projected
  line L18 (-51.1421, -14.1421) -> (-72.3553, -35.3553) projected
  line L19 (-72.3553, -35.3553) -> (-74.4767, -33.234) projected
  line L20 (-74.4767, -33.234) -> (-81.5477, -40.3051) projected
  line L21 (-81.5477, -40.3051) -> (-79.4264, -42.4264) projected
  line L22 (-79.4264, -42.4264) -> (-88.6188, -51.6188) projected
  line L23 (-88.6188, -51.6188) -> (-70.1478, -70.0898) projected
  circle A2 centre (-29.5754, -25.8094) radius 1.5 projected
  circle A3 centre (-76.9515, -46.3155) radius 1.5 projected
  circle A4 centre (-43.0104, -12.3744) radius 1.5 projected
  circle A5 centre (-63.5165, -59.7505) radius 1.5 projected
  line L24 (-80.1335, -51.6188) -> (-68.8198, -62.9325) projected
  line L25 (-68.8198, -62.9325) -> (-70.9411, -65.0538) projected
  line L26 (-70.9411, -65.0538) -> (-82.2548, -53.7401) projected
  line L27 (-82.2548, -53.7401) -> (-80.1335, -51.6188) projected
  circle A6 centre (-25.599, -35) radius 1.5 projected
  circle A7 centre (-3.599, -29) radius 1.5 projected
  circle A8 centre (-14.599, -11) radius 1.5 projected
  circle A9 centre (-14.599, -35) radius 1.5 projected
  circle A10 centre (-3.599, -5) radius 1.5 projected
  circle A11 centre (-14.599, -5) radius 1.5 projected
  circle A12 centre (-14.599, -29) radius 1.5 projected
  circle A13 centre (-3.599, -11) radius 1.5 projected
  circle A14 centre (-3.599, -35) radius 1.5 projected
  circle A15 centre (-43.364, -45.9619) radius 1.5 projected
equation "\"d21\" = d8"
equation "\"d26\" = d25"
equation "\"d30\" = d28"
equation "\"d35\" = d31"
equation "\"d36\" = d31"
equation "\"d37\" = d31"
equation "\"d52\" = d51"
equation "\"d53\" = d51"
equation "\"d54\" = d51"
equation "\"d55\" = d51"
equation "\"d56\" = d51"
equation "\"d57\" = d51"
equation "\"d58\" = d51"
equation "\"d59\" = d51"
equation "\"d67\" = d63"
equation "\"d8\" = 3"
properties part number "motor mount side" material "Polycarbonate, Clear"
